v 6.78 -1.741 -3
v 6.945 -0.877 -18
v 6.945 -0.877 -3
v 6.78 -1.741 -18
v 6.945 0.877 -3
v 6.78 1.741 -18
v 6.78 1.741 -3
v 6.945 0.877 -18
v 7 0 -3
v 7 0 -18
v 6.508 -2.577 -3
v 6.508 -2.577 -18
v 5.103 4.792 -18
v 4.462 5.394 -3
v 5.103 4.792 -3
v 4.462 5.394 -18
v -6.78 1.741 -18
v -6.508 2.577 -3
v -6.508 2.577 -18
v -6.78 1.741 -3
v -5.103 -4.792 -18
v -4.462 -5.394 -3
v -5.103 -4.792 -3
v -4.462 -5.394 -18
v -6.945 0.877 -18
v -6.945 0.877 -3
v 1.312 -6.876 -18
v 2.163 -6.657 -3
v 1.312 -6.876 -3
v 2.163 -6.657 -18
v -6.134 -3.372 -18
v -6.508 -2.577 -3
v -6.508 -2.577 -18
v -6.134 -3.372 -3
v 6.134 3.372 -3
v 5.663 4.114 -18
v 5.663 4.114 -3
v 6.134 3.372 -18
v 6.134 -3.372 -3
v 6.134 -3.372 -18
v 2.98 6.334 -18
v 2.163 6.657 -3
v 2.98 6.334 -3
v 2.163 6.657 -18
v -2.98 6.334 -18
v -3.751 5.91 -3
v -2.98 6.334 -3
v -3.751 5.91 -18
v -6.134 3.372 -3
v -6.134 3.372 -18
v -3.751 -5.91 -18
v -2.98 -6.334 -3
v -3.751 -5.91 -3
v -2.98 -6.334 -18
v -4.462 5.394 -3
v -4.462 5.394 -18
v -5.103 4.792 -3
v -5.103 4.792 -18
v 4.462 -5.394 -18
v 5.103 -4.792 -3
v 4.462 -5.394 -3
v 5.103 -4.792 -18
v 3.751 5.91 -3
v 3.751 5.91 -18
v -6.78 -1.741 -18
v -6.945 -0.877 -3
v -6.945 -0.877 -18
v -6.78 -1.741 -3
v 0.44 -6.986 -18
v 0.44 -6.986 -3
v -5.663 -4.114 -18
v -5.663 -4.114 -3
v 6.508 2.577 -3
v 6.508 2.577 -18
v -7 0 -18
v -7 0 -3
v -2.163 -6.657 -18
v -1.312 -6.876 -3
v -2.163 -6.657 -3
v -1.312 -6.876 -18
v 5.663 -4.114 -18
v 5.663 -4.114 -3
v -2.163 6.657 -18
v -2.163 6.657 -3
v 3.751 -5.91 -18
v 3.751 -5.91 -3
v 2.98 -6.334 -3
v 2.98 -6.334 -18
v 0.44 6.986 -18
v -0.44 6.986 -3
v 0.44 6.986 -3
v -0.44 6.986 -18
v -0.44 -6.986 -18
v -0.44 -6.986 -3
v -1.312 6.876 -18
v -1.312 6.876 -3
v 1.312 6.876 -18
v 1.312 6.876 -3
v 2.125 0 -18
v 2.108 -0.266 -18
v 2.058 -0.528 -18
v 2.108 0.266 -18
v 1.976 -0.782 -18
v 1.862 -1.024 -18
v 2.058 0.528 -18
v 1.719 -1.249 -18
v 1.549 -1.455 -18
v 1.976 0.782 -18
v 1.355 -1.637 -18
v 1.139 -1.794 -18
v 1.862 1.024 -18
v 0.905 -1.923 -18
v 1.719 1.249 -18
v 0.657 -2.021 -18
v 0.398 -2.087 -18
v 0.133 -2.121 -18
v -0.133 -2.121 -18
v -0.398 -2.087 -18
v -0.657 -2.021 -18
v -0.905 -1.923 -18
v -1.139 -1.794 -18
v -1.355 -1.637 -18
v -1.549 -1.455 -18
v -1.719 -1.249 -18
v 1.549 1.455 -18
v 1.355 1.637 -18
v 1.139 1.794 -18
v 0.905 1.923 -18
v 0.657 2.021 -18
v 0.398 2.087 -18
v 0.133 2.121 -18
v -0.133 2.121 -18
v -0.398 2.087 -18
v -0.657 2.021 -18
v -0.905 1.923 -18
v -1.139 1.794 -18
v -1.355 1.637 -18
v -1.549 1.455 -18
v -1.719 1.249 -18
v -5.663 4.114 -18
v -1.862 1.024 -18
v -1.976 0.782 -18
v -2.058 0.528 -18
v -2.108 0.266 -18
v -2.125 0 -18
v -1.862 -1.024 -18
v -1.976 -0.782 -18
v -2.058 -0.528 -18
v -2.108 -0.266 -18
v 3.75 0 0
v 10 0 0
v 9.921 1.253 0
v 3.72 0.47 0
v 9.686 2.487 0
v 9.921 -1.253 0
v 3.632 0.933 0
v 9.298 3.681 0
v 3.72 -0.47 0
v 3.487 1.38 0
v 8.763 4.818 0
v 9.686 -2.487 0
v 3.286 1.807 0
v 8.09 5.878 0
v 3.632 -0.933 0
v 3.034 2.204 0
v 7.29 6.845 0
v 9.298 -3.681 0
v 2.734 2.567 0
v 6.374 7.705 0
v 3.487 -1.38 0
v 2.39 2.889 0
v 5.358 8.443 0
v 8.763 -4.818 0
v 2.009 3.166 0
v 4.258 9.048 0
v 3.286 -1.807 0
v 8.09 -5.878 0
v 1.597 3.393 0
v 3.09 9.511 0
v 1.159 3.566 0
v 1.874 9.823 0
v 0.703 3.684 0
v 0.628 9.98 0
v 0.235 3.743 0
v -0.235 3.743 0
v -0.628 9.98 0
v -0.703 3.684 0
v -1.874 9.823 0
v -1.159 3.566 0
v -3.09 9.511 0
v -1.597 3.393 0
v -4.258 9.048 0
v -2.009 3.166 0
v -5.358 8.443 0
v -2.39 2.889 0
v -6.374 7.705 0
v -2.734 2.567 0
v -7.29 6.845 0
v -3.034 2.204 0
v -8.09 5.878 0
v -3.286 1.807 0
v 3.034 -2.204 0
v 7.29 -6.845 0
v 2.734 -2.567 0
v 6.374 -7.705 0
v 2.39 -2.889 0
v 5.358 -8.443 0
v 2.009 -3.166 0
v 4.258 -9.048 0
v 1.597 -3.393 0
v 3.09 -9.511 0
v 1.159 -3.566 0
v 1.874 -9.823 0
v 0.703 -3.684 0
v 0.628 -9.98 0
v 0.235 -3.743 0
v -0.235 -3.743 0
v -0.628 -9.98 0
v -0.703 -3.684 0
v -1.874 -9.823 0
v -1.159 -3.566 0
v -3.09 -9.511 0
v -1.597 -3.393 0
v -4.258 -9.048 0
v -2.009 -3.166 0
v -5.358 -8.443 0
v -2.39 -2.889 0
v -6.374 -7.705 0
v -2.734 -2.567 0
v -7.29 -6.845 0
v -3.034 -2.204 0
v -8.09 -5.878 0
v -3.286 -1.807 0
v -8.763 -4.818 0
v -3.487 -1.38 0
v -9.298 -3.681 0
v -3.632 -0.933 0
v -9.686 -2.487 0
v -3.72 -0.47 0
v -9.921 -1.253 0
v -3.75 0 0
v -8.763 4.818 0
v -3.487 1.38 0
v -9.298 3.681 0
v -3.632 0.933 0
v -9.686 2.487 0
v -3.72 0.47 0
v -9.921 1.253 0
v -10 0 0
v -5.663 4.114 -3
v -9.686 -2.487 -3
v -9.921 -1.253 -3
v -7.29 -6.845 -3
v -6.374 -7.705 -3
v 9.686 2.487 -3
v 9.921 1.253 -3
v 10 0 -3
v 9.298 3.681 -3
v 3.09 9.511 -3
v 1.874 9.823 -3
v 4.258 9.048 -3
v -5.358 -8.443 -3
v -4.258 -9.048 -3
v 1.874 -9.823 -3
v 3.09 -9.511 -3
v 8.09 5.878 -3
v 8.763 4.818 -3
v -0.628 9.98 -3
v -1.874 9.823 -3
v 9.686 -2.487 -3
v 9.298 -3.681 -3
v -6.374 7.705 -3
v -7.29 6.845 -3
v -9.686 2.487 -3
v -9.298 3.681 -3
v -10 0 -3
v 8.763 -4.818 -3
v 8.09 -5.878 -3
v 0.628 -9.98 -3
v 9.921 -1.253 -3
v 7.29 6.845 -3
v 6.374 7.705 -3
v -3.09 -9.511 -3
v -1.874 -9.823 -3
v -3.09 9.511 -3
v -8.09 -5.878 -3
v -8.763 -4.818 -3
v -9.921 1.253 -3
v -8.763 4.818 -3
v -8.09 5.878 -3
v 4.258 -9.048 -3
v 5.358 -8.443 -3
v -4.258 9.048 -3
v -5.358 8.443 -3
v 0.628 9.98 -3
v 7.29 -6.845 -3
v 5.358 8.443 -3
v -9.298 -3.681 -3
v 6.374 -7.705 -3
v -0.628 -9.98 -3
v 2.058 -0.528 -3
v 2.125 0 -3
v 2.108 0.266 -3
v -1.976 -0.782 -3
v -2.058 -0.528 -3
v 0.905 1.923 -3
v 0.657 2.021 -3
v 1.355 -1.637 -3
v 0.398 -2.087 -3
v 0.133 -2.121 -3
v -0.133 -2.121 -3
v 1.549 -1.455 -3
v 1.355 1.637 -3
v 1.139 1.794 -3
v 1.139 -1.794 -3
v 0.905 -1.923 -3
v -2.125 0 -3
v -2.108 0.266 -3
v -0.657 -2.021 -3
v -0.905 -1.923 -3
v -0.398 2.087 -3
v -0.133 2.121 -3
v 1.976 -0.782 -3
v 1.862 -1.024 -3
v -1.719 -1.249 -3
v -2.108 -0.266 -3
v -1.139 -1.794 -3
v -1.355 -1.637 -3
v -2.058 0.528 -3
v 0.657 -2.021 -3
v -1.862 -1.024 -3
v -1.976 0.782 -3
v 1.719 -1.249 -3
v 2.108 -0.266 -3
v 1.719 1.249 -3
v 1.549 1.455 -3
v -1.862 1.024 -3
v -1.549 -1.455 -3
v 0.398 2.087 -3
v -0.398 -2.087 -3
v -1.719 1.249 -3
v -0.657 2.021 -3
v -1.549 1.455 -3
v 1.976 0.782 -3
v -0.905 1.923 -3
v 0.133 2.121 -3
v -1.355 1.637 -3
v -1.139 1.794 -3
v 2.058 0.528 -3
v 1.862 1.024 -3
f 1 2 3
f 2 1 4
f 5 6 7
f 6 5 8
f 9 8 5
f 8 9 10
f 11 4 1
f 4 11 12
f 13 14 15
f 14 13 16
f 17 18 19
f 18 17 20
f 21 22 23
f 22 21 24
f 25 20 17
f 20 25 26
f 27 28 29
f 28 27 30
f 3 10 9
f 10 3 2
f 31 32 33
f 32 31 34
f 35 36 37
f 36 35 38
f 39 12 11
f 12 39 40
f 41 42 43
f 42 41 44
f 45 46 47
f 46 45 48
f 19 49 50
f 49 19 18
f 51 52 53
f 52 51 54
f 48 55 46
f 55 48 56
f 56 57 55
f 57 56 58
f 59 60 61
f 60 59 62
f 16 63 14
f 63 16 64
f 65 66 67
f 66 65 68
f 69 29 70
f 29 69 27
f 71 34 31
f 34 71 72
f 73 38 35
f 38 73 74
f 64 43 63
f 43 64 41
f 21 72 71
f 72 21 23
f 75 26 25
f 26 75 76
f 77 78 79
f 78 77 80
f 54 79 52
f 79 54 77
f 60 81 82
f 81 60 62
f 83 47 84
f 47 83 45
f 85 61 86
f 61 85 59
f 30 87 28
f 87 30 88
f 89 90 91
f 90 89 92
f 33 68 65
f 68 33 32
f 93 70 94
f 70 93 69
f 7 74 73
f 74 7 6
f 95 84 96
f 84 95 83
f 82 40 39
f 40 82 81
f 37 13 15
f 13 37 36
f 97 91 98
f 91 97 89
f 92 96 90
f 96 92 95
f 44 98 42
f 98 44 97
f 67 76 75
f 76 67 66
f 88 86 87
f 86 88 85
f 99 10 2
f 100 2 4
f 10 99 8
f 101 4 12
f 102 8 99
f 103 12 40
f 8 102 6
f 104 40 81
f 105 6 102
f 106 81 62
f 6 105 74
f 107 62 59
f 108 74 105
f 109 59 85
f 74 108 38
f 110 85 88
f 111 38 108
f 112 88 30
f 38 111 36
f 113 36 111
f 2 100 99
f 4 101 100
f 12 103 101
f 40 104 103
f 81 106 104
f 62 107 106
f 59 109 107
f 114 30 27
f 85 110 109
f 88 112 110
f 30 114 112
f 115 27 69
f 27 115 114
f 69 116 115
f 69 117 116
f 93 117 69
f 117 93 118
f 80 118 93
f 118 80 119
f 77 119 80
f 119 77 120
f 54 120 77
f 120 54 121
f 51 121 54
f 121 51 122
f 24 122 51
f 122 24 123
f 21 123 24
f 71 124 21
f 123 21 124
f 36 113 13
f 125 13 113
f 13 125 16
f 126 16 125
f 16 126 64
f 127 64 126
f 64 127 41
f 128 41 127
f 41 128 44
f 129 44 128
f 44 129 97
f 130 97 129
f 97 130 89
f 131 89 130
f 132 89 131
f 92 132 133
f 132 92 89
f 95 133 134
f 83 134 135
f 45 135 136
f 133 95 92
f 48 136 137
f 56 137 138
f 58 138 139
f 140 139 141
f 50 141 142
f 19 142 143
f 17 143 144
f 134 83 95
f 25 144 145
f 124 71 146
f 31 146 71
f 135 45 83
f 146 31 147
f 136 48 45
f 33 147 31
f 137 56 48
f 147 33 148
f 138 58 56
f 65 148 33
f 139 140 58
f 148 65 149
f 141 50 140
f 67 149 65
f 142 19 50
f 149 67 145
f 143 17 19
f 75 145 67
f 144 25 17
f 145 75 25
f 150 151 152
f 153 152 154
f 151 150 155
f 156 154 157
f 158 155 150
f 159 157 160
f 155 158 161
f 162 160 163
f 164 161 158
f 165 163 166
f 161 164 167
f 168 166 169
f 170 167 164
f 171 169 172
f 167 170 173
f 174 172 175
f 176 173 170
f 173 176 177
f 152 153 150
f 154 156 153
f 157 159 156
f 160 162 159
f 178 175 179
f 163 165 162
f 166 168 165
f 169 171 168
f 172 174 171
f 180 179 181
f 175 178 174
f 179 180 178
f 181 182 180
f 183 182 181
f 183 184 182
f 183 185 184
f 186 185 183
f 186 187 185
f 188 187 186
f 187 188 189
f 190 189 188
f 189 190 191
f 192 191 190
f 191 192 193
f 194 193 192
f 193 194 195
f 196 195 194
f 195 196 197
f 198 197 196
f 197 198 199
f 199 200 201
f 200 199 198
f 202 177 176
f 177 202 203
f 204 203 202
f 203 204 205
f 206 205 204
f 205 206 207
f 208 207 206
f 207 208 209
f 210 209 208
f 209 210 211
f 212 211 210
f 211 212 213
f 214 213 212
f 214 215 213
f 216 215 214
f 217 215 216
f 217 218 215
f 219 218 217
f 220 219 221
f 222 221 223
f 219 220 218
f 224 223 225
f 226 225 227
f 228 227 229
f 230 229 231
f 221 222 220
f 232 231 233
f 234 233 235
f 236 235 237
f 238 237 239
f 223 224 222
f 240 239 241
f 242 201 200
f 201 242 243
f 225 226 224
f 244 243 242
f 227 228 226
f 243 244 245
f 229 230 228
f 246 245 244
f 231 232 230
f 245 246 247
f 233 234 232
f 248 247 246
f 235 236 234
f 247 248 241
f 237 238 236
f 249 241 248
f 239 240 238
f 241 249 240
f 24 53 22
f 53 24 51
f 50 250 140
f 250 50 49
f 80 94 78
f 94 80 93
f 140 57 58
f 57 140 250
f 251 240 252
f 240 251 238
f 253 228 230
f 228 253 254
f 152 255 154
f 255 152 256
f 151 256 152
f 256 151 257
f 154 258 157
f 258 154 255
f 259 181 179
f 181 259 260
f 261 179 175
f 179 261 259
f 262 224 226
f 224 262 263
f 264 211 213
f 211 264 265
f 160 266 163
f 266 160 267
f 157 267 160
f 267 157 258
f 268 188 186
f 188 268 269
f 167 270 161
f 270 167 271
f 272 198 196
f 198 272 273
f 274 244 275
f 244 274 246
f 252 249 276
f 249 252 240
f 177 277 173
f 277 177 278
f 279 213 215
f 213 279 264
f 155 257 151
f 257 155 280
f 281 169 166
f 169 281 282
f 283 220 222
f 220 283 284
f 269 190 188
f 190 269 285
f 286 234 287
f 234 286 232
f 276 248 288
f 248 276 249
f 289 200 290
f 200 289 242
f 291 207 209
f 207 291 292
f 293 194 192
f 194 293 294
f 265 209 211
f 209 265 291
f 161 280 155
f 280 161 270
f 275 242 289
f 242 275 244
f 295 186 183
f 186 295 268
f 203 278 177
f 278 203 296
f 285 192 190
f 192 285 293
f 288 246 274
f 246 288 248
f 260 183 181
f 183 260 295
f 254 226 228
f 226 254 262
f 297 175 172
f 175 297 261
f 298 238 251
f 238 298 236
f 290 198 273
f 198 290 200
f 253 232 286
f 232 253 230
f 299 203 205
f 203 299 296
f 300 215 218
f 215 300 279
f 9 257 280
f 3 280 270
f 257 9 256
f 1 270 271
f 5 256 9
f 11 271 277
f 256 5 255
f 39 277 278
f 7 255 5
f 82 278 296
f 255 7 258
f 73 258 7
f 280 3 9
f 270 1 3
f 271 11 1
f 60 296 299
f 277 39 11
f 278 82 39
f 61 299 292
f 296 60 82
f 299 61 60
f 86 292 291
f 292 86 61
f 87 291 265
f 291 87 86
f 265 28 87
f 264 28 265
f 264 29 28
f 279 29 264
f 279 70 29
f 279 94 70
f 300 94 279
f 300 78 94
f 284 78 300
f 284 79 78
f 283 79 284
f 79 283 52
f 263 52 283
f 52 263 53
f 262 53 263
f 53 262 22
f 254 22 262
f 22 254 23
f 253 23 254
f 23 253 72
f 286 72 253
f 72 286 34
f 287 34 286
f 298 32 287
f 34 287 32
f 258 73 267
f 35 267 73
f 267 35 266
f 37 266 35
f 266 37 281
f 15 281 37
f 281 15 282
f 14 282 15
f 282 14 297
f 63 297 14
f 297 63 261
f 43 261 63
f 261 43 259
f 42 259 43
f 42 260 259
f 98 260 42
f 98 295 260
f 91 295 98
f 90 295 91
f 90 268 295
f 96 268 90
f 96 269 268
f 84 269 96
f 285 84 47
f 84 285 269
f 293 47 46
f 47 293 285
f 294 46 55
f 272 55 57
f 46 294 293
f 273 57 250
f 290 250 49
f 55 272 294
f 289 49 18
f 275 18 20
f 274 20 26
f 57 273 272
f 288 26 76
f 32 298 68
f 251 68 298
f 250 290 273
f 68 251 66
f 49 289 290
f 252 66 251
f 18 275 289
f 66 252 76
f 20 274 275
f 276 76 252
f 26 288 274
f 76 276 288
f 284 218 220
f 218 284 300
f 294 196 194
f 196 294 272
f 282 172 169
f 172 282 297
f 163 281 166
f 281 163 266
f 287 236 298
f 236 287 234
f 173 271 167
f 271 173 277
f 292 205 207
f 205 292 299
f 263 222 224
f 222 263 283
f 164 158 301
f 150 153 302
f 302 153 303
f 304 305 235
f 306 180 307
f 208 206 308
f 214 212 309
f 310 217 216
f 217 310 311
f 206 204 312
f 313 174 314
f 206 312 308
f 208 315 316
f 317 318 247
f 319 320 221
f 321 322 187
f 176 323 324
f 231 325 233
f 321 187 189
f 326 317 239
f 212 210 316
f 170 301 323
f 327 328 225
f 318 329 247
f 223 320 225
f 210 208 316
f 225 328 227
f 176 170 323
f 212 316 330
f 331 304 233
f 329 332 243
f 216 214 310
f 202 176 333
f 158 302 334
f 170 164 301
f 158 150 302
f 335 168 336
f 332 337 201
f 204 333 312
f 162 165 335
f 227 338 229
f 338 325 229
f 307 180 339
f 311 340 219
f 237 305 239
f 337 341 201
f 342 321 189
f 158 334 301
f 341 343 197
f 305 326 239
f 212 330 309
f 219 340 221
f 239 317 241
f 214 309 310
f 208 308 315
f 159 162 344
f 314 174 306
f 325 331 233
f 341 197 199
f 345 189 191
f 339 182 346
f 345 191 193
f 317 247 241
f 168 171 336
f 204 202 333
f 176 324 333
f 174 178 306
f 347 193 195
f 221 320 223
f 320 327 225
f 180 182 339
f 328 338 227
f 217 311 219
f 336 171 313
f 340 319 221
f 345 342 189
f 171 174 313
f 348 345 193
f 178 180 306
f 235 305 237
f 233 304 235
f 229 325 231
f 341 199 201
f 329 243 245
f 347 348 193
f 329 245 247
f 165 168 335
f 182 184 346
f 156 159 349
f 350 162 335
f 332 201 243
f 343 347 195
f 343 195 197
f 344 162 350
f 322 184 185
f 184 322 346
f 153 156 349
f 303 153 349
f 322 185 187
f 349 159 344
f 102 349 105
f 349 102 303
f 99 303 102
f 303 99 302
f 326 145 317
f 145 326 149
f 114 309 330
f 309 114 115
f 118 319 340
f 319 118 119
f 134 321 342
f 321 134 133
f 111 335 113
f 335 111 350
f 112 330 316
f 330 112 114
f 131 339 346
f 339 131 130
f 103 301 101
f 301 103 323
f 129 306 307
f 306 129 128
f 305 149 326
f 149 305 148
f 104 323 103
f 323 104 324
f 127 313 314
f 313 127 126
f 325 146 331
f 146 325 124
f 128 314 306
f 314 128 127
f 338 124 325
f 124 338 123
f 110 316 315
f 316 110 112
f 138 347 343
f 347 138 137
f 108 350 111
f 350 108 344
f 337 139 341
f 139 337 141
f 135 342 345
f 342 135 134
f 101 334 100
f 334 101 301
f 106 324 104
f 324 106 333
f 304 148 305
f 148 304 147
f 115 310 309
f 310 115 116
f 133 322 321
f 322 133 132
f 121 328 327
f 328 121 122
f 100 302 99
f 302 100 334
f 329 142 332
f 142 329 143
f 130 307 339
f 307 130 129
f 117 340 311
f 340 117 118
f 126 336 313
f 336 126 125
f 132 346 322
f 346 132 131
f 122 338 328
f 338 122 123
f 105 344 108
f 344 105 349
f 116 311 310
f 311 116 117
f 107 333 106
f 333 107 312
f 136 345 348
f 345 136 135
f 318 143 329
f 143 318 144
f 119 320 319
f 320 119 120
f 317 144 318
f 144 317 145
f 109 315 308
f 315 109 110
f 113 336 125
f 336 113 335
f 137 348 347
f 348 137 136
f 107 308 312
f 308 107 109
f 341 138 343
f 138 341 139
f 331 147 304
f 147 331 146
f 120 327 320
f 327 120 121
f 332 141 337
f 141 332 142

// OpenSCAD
$fn = 50;


difference() {
	union() {
		translate(v = [0, 0, -18.0000000000]) {
			cylinder(h = 18, r = 7.0000000000);
		}
		translate(v = [0, 0, -3.0000000000]) {
			cylinder(h = 3, r = 10.0000000000);
		}
	}
	union() {
		translate(v = [0, 0, 0]) {
			rotate(a = [0, 0, 0]) {
				difference() {
					union() {
						#translate(v = [0, 0, -18.0000000000]) {
							cylinder(h = 18, r = 2.0000000000);
						}
						#translate(v = [0, 0, -3]) {
							cylinder(h = 3, r1 = 2.1250000000, r2 = 3.7500000000);
						}
						#translate(v = [0, 0, -18.0000000000]) {
							cylinder(h = 18, r = 2.1250000000);
						}
						#translate(v = [0, 0, -18.0000000000]) {
							cylinder(h = 18, r = 2.0000000000);
						}
					}
					union();
				}
			}
		}
	}
}
